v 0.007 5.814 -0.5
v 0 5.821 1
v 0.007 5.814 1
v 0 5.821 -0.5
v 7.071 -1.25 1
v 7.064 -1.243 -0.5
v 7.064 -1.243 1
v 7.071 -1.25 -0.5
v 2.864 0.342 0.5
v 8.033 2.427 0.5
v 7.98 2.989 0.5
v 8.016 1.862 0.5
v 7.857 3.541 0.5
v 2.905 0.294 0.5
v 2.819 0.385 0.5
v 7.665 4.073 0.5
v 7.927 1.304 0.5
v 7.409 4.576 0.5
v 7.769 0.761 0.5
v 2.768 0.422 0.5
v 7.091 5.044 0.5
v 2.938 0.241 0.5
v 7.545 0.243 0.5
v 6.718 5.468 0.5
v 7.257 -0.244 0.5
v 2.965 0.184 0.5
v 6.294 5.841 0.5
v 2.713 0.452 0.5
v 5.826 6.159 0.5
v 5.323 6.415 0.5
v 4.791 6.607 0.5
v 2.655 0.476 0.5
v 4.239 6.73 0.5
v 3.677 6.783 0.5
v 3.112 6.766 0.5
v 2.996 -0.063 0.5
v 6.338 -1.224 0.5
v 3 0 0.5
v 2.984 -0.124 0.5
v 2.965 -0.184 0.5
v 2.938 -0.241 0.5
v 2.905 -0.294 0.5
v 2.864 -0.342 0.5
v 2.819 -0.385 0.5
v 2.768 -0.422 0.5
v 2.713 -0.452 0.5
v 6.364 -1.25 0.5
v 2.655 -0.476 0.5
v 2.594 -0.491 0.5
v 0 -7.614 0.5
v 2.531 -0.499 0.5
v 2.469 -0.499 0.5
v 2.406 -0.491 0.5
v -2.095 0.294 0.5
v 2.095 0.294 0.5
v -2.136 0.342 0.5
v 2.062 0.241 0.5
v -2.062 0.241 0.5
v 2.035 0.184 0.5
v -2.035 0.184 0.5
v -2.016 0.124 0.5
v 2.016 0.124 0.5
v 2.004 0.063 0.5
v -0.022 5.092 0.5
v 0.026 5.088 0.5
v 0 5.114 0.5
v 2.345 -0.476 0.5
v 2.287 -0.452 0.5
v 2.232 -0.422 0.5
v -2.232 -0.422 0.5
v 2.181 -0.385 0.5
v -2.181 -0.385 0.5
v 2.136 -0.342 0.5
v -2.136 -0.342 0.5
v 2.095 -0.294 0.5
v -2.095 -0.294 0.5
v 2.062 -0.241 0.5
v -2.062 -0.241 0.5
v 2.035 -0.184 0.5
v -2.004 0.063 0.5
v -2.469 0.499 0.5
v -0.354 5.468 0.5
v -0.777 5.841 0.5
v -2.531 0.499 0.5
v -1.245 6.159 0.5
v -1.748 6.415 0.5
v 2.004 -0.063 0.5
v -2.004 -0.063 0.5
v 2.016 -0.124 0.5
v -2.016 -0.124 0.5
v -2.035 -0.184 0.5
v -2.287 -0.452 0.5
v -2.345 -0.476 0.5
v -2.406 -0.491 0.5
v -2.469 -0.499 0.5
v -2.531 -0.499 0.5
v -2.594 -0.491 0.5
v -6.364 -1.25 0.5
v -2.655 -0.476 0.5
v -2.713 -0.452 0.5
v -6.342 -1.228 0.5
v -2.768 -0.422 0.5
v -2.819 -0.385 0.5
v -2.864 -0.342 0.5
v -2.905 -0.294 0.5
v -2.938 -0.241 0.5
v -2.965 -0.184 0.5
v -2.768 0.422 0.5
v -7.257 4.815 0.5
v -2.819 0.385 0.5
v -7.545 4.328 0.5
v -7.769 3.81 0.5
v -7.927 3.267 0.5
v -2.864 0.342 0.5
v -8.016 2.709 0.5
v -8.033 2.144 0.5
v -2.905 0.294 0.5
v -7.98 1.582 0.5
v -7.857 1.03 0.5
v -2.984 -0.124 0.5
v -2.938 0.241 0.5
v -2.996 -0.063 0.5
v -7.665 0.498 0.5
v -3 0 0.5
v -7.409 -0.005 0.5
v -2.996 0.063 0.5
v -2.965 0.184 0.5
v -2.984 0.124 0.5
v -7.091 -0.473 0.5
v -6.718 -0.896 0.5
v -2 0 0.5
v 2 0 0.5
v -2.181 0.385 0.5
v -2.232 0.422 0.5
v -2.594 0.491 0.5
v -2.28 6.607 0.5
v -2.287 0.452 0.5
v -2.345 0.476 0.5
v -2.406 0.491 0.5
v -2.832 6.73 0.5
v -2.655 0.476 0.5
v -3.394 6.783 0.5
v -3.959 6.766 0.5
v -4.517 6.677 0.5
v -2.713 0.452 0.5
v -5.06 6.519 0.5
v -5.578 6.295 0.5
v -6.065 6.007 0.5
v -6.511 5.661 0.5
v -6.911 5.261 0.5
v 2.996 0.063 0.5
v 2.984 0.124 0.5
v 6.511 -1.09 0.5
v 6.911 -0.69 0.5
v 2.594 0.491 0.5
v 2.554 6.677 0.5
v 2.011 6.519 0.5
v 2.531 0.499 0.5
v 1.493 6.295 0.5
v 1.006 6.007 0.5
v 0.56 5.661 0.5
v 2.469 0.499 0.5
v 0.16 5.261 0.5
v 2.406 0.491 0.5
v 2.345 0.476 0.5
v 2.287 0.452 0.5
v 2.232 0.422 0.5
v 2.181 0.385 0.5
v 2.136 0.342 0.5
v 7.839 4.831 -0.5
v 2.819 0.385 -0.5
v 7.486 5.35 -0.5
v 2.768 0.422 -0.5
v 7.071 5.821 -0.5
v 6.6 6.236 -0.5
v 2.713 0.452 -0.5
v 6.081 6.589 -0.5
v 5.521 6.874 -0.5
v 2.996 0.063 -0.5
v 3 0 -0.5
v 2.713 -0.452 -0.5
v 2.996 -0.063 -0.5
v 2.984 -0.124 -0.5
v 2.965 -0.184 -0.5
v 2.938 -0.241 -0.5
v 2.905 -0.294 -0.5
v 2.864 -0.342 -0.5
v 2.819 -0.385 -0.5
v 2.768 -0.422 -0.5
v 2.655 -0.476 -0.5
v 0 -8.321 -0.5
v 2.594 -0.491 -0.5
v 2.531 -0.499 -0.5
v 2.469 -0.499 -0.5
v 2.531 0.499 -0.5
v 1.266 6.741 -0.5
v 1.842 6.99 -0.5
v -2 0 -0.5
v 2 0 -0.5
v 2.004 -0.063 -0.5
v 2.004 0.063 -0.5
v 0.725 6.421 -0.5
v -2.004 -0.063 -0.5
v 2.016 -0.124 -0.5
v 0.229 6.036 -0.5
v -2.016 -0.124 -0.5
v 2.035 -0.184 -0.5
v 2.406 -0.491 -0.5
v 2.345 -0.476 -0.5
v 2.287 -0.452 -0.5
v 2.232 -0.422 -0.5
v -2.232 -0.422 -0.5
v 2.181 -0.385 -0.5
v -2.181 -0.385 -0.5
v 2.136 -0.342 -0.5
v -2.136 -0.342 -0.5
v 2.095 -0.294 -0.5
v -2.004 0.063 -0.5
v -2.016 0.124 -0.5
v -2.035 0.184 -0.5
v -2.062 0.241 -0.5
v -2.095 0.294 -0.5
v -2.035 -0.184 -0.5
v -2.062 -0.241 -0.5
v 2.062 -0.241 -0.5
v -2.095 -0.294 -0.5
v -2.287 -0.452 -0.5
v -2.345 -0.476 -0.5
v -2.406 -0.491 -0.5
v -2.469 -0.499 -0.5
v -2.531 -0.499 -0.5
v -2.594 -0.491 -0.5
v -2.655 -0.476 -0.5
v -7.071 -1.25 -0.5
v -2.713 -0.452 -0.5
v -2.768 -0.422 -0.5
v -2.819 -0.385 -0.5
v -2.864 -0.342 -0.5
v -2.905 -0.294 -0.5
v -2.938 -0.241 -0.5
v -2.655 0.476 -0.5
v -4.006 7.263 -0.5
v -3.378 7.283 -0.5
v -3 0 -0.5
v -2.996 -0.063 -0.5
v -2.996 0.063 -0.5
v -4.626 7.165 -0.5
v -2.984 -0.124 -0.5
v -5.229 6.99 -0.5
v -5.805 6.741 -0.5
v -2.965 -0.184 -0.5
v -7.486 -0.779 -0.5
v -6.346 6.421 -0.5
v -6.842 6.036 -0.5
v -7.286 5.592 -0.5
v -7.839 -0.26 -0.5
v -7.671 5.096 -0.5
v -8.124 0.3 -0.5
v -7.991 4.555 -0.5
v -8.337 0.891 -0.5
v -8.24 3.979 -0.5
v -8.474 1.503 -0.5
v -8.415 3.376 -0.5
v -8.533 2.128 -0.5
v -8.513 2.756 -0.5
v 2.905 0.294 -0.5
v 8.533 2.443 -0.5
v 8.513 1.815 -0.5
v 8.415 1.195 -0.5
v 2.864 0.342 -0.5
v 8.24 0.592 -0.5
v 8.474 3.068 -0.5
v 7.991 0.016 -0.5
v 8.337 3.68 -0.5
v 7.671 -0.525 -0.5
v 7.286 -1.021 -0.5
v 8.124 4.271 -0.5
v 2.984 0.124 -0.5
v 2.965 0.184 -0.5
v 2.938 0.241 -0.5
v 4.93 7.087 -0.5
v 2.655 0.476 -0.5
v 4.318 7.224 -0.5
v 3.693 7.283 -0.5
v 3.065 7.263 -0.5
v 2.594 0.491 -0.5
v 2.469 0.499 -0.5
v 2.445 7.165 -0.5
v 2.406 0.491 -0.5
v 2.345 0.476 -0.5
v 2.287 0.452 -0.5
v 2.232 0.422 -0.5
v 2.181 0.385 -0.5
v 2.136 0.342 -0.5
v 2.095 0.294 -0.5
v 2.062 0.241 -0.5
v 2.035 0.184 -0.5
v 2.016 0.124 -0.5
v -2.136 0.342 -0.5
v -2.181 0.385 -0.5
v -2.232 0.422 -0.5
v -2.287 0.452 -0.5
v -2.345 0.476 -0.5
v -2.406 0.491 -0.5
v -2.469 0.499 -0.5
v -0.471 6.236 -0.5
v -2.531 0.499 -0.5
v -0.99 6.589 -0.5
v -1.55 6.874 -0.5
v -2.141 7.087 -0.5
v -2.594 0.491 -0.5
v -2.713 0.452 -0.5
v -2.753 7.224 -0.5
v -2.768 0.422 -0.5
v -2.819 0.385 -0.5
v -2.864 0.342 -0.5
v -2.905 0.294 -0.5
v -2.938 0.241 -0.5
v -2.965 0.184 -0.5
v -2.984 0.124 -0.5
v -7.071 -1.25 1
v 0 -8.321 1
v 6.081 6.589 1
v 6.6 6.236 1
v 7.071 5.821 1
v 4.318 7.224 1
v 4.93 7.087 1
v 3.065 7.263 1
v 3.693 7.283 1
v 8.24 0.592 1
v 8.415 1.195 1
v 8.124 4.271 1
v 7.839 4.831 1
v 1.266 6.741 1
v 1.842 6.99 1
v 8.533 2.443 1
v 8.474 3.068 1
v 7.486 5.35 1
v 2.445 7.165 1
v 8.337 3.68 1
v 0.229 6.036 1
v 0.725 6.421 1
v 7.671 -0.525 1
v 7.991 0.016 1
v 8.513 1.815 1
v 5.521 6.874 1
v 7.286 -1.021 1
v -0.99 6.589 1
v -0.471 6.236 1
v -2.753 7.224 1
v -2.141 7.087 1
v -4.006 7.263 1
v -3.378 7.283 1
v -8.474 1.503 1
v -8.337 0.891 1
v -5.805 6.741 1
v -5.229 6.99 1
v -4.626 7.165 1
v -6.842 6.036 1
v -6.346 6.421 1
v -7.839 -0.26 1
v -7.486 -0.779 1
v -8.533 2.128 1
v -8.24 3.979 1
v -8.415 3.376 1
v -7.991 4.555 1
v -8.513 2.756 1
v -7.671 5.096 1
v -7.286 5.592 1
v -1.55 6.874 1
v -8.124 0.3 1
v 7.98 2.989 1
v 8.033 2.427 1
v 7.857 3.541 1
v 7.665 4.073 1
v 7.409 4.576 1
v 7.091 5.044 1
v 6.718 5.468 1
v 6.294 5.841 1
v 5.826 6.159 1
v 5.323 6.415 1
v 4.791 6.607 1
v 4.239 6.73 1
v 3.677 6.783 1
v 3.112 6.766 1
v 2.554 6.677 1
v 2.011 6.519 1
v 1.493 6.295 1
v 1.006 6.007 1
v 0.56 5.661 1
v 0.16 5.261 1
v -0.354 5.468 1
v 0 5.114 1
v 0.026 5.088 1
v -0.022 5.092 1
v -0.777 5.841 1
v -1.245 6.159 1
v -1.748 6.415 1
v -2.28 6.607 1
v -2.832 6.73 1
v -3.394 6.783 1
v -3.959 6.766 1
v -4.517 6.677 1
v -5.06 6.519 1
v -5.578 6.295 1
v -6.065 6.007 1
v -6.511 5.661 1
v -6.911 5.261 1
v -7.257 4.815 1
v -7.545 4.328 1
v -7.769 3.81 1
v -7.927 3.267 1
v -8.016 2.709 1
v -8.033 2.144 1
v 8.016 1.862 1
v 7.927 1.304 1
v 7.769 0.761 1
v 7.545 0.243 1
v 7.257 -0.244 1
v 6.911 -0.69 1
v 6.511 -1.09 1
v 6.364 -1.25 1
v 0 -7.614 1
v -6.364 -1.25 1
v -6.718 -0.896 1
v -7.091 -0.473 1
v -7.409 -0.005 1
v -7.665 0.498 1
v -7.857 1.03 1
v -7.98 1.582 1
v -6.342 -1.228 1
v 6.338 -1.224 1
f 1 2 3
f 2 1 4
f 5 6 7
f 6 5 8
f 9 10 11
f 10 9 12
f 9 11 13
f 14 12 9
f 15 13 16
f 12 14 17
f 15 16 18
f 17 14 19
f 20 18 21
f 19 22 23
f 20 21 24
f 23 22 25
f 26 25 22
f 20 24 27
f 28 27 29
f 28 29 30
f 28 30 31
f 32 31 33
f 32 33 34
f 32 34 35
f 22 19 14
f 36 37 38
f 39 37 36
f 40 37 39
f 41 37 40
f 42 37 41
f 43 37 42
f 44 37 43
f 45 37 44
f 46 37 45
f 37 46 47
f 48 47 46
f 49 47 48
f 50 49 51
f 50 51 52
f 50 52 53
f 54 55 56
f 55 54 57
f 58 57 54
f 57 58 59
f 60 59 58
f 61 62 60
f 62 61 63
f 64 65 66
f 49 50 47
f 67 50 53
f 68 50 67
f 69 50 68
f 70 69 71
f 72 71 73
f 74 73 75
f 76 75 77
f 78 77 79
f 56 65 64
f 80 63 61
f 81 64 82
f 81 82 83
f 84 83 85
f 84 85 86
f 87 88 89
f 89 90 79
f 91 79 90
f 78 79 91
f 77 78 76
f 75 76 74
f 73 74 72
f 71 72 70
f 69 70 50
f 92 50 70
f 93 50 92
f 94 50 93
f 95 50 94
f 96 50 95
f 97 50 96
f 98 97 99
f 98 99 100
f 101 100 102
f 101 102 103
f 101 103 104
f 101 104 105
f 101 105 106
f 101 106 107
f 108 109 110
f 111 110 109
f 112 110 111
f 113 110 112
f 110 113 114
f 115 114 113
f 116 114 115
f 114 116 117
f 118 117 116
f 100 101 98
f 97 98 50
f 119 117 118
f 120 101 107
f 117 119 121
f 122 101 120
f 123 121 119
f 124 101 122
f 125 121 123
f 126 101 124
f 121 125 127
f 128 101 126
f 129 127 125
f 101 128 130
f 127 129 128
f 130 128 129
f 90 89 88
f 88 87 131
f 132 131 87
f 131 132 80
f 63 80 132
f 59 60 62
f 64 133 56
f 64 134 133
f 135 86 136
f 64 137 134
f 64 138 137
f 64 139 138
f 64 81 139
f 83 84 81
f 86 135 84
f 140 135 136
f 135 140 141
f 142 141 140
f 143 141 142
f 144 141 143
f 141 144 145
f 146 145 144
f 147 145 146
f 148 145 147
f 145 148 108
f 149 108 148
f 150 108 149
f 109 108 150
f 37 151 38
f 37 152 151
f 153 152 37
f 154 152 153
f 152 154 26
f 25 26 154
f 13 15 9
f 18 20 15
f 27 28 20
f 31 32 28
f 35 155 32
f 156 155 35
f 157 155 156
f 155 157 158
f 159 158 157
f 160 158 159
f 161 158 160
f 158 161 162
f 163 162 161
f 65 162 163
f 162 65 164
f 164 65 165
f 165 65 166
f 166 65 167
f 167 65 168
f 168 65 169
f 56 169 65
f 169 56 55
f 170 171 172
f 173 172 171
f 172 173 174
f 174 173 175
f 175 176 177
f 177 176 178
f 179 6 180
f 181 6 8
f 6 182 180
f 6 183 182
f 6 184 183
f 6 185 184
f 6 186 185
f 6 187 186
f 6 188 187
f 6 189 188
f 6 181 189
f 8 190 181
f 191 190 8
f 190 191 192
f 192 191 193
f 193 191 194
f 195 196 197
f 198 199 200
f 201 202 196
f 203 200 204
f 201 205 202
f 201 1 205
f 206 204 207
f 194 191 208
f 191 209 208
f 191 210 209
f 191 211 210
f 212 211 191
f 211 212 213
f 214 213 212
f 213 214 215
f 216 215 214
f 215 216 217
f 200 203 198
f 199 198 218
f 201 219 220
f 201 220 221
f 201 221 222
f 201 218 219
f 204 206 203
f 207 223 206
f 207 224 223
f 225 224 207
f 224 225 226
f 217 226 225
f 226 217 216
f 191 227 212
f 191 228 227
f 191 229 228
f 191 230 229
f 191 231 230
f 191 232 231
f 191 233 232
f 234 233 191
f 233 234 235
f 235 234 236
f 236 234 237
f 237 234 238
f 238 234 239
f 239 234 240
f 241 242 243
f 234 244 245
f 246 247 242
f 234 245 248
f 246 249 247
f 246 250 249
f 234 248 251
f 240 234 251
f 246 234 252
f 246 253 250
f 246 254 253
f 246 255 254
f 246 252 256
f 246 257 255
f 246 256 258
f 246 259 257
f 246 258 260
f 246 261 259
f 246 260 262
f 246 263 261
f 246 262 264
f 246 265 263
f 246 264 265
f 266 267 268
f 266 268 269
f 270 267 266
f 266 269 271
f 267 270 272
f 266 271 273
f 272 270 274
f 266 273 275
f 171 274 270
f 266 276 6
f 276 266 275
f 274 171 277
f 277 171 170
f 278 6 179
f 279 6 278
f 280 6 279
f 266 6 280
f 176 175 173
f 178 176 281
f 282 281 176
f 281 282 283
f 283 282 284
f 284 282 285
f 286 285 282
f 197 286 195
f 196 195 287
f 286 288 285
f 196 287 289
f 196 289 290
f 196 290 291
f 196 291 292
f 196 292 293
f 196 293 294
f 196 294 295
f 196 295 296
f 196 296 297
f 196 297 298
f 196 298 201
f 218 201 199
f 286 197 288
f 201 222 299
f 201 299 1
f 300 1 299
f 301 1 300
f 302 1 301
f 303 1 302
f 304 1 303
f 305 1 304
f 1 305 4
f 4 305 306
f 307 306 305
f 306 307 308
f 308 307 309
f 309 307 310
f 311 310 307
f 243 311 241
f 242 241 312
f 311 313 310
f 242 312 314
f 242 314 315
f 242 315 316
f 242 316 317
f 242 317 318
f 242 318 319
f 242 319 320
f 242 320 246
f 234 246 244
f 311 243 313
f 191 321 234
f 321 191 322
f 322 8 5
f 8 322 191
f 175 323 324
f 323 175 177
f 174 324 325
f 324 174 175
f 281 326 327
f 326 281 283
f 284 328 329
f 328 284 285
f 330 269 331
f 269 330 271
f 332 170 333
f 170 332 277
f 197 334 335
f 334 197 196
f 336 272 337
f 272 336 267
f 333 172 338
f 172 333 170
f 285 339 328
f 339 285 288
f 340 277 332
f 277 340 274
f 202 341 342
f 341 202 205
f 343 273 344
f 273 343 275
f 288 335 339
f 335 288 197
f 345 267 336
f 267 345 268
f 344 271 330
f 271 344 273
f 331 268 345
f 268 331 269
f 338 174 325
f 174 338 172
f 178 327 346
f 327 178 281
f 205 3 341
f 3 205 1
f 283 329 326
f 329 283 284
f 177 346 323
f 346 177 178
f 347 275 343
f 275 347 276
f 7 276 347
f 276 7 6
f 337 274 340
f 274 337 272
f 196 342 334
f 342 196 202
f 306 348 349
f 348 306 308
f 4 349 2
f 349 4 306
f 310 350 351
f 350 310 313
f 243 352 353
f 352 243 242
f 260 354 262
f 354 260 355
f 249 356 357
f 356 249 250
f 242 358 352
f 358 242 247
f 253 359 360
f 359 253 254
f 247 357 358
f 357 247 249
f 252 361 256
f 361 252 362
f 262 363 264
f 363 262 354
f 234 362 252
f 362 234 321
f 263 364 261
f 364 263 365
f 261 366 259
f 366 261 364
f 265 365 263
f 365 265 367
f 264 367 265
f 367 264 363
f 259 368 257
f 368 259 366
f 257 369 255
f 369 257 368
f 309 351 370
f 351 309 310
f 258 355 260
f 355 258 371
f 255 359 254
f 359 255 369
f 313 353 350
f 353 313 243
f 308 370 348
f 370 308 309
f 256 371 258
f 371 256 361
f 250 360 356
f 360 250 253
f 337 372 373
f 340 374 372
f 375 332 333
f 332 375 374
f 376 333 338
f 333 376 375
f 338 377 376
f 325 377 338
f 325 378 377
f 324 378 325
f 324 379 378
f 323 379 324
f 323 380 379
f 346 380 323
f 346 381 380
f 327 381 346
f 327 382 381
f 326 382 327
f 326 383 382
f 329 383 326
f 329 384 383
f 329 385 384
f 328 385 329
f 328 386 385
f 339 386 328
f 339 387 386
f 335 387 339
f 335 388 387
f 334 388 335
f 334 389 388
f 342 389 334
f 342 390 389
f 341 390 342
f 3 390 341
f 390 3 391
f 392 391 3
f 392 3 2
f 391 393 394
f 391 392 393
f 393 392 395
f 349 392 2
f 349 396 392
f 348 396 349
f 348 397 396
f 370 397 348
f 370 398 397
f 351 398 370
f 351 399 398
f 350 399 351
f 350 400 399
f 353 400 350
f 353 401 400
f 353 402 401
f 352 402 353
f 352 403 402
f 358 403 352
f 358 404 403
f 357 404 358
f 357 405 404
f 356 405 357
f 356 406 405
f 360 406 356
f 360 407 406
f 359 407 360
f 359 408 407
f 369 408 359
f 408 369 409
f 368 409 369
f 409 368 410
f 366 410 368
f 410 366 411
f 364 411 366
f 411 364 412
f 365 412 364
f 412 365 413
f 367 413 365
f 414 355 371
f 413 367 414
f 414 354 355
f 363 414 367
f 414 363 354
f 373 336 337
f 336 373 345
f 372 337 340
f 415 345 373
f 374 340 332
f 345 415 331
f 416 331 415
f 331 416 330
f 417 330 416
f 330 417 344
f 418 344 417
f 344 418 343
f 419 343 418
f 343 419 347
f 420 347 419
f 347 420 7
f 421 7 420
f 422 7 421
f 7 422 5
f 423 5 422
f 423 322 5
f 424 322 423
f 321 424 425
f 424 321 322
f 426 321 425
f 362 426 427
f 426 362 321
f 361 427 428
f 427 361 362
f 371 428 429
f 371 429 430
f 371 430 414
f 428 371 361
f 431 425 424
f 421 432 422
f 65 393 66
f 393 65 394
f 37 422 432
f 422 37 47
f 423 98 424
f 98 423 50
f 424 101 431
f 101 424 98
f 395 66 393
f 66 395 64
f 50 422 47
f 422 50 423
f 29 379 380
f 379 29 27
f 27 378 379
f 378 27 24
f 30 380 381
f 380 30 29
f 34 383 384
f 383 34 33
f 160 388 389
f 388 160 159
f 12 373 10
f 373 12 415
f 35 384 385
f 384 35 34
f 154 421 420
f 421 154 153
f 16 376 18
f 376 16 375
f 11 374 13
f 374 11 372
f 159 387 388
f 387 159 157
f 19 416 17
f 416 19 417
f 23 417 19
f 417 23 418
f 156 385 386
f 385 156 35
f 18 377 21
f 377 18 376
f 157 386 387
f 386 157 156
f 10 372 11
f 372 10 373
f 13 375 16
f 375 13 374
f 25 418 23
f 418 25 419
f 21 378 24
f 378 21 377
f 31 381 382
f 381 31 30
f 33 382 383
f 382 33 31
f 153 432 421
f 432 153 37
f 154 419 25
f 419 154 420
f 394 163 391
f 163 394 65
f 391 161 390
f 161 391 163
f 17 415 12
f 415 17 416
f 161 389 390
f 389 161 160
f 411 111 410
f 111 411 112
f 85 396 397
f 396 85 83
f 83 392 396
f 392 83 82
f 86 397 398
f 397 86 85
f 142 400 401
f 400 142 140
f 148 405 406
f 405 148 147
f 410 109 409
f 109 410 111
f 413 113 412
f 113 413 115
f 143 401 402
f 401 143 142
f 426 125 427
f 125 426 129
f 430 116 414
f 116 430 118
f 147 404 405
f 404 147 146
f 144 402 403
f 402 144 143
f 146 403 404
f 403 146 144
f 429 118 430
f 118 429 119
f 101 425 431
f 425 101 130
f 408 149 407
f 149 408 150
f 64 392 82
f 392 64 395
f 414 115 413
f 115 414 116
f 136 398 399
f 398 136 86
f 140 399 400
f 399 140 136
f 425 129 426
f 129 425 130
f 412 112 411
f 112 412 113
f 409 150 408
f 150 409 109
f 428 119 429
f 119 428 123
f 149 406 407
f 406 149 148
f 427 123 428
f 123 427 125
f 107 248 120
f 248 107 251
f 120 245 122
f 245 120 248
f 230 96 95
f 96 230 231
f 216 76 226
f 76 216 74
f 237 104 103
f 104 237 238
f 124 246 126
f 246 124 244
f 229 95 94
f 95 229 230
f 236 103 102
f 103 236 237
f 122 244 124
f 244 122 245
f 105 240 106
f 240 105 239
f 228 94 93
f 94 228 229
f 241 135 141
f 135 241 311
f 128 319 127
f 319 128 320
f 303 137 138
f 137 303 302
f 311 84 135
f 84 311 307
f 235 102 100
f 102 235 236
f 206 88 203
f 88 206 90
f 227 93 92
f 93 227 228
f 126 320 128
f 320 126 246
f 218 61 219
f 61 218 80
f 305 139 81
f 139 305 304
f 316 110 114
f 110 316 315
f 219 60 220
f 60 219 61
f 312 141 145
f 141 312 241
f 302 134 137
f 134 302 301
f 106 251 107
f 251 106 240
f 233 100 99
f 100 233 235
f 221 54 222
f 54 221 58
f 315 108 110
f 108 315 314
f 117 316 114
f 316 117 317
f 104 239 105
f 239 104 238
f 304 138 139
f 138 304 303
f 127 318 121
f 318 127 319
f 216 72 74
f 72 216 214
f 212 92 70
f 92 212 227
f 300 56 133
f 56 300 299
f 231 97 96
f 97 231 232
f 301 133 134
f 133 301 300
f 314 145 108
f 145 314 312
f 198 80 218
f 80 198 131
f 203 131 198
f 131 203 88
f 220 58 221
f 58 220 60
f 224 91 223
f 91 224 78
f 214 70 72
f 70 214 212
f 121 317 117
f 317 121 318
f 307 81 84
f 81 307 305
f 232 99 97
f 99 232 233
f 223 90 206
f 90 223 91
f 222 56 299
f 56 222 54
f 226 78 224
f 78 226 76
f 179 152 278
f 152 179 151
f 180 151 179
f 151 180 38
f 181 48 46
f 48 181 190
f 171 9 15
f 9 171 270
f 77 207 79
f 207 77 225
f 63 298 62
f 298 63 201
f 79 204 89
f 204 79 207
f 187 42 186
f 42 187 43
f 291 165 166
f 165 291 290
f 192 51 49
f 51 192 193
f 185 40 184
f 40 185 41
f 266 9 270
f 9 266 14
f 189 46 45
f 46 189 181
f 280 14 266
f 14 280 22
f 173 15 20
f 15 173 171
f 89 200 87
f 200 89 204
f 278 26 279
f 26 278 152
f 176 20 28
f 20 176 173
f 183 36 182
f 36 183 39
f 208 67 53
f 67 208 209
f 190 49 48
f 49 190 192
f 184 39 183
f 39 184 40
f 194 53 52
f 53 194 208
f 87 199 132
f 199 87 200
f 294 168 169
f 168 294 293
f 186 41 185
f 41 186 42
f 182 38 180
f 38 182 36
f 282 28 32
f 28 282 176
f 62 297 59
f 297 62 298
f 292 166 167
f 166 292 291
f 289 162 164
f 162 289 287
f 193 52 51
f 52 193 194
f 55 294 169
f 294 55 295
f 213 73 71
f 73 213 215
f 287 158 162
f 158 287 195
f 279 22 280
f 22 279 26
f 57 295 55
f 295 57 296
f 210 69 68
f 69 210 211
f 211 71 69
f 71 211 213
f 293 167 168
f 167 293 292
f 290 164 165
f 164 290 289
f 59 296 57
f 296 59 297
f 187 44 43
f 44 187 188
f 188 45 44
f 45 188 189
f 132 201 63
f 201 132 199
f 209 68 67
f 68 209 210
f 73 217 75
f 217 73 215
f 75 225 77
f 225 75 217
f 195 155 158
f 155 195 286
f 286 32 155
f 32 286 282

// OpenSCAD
//+-------------------------------------------------+
//|OPENSCAD Bouton de mercercie - haberdasher Button|
//|        2015 gaziel@gmail.com                    |
//+- -----------------------------------------------+   

//your choice...   
type="love";//[round,square,flower,cat,bunny,MMice,love]

//external diameter or length of the button
bd=10;

//thinkness
bep=1;

//border ? Yes of course!
border="yes";//[yes,no]

//allowance
borderep=1;

//size  for the border 
borderd=1;

//number of holes
hn=2;//[2,4,6]

//hole diameter
hd=1;

//holes repartition diameter
hr=4;

$fn=100/2;

bouton();

module bouton(){
    difference(){
        corps();
        for (i=[1:hn]){
            rotate([0,0,(i*360)/hn])translate([(hr+hd)/2,0,0]) cylinder(d=hd,h=bep+1,center=true);
        }
    } 
}
module corps(){
   if (type=="round"){
       cylinder(d=bd,h=bep,center=true);
       if (border=="yes"){
           difference(){
               translate([0,0,bep/2])cylinder(d=bd,h=borderep,center=true);
               translate([0,0,bep/2])cylinder(d=bd-borderd,h=borderep+1,center=true);
           }
        }          
   }
  if (type=="square"){
   cube([bd,bd,bep],center=true);
   if (border=="yes"){
       difference(){
           translate([0,0,bep/2]) cube([bd,bd,borderep],center=true);
           translate([0,0,bep/2])cube([bd-borderd,bd-borderd,borderep+1],center=true);
       }
    }          
}
  if (type=="flower"){
   for (i=[1:6]){
    rotate([0,0,(i*360)/6])translate([bd/3,0,0]) cylinder(d=bd/3,h=bep,center=true);
   }
   cylinder(d=bd/1.6,h=bep,center=true);
   if (border=="yes"){
       difference(){
           union(){
                  for (i=[1:6]){
translate([0,0,bep/2])    rotate([0,0,(i*360)/6])translate([bd/3,0,0]) cylinder(d=bd/3,h=borderep,center=true);
   }
  translate([0,0,bep/2]) cylinder(d=bd/1.6,h=borderep,center=true);
           }
                      union(){
                  for (i=[1:6]){
translate([0,0,bep/2])    rotate([0,0,(i*360)/6])translate([bd/3,0,0]) cylinder(d=(bd/3)-borderd,h=borderep+1,center=true);
   }
  translate([0,0,bep/2]) cylinder(d=(bd/1.6)-borderd/2,h=borderep+1,center=true);
           }

       }
    }          
}
    if (type=="cat"){
        cylinder(d=bd,h=bep,center=true);
        difference(){
            union(){
                rotate([0,0,33])scale([0.5,1.5,1])cylinder(d=bd,h=bep,center=true);
                rotate([0,0,-33])scale([0.5,1.5,1])cylinder(d=bd,h=bep,center=true);
            }    
            translate([-bd/2,0,-bd/2])cube(bd);
            
        }
       if (border=="yes"){
           difference(){
               translate([0,0,bep/2])cylinder(d=bd,h=borderep,center=true);
               translate([0,0,bep/2])cylinder(d=bd-borderd,h=borderep+1,center=true);
           }
        }          
   }
   
       if (type=="bunny"){//bof
        cylinder(d=bd,h=bep,center=true);
        difference(){
            union(){
                translate([bd/2,-bd/2,0])rotate([0,0,33])scale([0.5,1.2,1])cylinder(d=bd,h=bep,center=true);
                translate([-bd/2,-bd/2,0])rotate([0,0,-33])scale([0.5,1.2,1])cylinder(d=bd,h=bep,center=true);
            }    
           
            
        }
       if (border=="yes"){
           difference(){
               translate([0,0,bep/2])cylinder(d=bd,h=borderep,center=true);
               translate([0,0,bep/2])cylinder(d=bd-borderd,h=borderep+1,center=true);
           }
        }          
   }
   
      if (type=="MMice"){
        cylinder(d=bd,h=bep,center=true);
        difference(){
            union(){
                translate([bd/2,-bd/2,0])rotate([0,0,33])cylinder(d=bd/1.618,h=bep,center=true);
                translate([-bd/2,-bd/2,0])rotate([0,0,-33])cylinder(d=bd/1.618,h=bep,center=true);
            }       
         }
       if (border=="yes"){
           difference(){
               translate([0,0,bep/2])cylinder(d=bd,h=borderep,center=true);
               translate([0,0,bep/2])cylinder(d=bd-borderd,h=borderep+1,center=true);
           }
        }          
   }
     if (type=="love"){
       translate([0,-bd/8,0])rotate([0,0,45]){
         cube([bd,bd,bep],center=true);
         translate([bd/2,0,0])cylinder(d=bd,h=bep,center=true);
         translate([0,bd/2,0])cylinder(d=bd,h=bep,center=true);
       }      
       if (border=="yes"){
           difference(){
               translate([0,0,bep/2]) union(){ 
                 translate([0,-bd/8,0])rotate([0,0,45]){
                 cube([bd,bd,bep],center=true);
                 translate([bd/2,0,0])cylinder(d=bd,h=bep,center=true);
                 translate([0,bd/2,0])cylinder(d=bd,h=bep,center=true);
                 }
               }
               translate([0,0,bep/2]) union(){ 
                 translate([0,-bd/8,0])rotate([0,0,45]){
                 cube([bd-borderd,bd-borderd,bep+1],center=true);
                 translate([bd/2,0,0])cylinder(d=bd-borderd,h=bep+1,center=true);
                 translate([0,bd/2,0])cylinder(d=bd-borderd,h=bep+1,center=true);
                 }
               }  
            }
       }
     }
 }
